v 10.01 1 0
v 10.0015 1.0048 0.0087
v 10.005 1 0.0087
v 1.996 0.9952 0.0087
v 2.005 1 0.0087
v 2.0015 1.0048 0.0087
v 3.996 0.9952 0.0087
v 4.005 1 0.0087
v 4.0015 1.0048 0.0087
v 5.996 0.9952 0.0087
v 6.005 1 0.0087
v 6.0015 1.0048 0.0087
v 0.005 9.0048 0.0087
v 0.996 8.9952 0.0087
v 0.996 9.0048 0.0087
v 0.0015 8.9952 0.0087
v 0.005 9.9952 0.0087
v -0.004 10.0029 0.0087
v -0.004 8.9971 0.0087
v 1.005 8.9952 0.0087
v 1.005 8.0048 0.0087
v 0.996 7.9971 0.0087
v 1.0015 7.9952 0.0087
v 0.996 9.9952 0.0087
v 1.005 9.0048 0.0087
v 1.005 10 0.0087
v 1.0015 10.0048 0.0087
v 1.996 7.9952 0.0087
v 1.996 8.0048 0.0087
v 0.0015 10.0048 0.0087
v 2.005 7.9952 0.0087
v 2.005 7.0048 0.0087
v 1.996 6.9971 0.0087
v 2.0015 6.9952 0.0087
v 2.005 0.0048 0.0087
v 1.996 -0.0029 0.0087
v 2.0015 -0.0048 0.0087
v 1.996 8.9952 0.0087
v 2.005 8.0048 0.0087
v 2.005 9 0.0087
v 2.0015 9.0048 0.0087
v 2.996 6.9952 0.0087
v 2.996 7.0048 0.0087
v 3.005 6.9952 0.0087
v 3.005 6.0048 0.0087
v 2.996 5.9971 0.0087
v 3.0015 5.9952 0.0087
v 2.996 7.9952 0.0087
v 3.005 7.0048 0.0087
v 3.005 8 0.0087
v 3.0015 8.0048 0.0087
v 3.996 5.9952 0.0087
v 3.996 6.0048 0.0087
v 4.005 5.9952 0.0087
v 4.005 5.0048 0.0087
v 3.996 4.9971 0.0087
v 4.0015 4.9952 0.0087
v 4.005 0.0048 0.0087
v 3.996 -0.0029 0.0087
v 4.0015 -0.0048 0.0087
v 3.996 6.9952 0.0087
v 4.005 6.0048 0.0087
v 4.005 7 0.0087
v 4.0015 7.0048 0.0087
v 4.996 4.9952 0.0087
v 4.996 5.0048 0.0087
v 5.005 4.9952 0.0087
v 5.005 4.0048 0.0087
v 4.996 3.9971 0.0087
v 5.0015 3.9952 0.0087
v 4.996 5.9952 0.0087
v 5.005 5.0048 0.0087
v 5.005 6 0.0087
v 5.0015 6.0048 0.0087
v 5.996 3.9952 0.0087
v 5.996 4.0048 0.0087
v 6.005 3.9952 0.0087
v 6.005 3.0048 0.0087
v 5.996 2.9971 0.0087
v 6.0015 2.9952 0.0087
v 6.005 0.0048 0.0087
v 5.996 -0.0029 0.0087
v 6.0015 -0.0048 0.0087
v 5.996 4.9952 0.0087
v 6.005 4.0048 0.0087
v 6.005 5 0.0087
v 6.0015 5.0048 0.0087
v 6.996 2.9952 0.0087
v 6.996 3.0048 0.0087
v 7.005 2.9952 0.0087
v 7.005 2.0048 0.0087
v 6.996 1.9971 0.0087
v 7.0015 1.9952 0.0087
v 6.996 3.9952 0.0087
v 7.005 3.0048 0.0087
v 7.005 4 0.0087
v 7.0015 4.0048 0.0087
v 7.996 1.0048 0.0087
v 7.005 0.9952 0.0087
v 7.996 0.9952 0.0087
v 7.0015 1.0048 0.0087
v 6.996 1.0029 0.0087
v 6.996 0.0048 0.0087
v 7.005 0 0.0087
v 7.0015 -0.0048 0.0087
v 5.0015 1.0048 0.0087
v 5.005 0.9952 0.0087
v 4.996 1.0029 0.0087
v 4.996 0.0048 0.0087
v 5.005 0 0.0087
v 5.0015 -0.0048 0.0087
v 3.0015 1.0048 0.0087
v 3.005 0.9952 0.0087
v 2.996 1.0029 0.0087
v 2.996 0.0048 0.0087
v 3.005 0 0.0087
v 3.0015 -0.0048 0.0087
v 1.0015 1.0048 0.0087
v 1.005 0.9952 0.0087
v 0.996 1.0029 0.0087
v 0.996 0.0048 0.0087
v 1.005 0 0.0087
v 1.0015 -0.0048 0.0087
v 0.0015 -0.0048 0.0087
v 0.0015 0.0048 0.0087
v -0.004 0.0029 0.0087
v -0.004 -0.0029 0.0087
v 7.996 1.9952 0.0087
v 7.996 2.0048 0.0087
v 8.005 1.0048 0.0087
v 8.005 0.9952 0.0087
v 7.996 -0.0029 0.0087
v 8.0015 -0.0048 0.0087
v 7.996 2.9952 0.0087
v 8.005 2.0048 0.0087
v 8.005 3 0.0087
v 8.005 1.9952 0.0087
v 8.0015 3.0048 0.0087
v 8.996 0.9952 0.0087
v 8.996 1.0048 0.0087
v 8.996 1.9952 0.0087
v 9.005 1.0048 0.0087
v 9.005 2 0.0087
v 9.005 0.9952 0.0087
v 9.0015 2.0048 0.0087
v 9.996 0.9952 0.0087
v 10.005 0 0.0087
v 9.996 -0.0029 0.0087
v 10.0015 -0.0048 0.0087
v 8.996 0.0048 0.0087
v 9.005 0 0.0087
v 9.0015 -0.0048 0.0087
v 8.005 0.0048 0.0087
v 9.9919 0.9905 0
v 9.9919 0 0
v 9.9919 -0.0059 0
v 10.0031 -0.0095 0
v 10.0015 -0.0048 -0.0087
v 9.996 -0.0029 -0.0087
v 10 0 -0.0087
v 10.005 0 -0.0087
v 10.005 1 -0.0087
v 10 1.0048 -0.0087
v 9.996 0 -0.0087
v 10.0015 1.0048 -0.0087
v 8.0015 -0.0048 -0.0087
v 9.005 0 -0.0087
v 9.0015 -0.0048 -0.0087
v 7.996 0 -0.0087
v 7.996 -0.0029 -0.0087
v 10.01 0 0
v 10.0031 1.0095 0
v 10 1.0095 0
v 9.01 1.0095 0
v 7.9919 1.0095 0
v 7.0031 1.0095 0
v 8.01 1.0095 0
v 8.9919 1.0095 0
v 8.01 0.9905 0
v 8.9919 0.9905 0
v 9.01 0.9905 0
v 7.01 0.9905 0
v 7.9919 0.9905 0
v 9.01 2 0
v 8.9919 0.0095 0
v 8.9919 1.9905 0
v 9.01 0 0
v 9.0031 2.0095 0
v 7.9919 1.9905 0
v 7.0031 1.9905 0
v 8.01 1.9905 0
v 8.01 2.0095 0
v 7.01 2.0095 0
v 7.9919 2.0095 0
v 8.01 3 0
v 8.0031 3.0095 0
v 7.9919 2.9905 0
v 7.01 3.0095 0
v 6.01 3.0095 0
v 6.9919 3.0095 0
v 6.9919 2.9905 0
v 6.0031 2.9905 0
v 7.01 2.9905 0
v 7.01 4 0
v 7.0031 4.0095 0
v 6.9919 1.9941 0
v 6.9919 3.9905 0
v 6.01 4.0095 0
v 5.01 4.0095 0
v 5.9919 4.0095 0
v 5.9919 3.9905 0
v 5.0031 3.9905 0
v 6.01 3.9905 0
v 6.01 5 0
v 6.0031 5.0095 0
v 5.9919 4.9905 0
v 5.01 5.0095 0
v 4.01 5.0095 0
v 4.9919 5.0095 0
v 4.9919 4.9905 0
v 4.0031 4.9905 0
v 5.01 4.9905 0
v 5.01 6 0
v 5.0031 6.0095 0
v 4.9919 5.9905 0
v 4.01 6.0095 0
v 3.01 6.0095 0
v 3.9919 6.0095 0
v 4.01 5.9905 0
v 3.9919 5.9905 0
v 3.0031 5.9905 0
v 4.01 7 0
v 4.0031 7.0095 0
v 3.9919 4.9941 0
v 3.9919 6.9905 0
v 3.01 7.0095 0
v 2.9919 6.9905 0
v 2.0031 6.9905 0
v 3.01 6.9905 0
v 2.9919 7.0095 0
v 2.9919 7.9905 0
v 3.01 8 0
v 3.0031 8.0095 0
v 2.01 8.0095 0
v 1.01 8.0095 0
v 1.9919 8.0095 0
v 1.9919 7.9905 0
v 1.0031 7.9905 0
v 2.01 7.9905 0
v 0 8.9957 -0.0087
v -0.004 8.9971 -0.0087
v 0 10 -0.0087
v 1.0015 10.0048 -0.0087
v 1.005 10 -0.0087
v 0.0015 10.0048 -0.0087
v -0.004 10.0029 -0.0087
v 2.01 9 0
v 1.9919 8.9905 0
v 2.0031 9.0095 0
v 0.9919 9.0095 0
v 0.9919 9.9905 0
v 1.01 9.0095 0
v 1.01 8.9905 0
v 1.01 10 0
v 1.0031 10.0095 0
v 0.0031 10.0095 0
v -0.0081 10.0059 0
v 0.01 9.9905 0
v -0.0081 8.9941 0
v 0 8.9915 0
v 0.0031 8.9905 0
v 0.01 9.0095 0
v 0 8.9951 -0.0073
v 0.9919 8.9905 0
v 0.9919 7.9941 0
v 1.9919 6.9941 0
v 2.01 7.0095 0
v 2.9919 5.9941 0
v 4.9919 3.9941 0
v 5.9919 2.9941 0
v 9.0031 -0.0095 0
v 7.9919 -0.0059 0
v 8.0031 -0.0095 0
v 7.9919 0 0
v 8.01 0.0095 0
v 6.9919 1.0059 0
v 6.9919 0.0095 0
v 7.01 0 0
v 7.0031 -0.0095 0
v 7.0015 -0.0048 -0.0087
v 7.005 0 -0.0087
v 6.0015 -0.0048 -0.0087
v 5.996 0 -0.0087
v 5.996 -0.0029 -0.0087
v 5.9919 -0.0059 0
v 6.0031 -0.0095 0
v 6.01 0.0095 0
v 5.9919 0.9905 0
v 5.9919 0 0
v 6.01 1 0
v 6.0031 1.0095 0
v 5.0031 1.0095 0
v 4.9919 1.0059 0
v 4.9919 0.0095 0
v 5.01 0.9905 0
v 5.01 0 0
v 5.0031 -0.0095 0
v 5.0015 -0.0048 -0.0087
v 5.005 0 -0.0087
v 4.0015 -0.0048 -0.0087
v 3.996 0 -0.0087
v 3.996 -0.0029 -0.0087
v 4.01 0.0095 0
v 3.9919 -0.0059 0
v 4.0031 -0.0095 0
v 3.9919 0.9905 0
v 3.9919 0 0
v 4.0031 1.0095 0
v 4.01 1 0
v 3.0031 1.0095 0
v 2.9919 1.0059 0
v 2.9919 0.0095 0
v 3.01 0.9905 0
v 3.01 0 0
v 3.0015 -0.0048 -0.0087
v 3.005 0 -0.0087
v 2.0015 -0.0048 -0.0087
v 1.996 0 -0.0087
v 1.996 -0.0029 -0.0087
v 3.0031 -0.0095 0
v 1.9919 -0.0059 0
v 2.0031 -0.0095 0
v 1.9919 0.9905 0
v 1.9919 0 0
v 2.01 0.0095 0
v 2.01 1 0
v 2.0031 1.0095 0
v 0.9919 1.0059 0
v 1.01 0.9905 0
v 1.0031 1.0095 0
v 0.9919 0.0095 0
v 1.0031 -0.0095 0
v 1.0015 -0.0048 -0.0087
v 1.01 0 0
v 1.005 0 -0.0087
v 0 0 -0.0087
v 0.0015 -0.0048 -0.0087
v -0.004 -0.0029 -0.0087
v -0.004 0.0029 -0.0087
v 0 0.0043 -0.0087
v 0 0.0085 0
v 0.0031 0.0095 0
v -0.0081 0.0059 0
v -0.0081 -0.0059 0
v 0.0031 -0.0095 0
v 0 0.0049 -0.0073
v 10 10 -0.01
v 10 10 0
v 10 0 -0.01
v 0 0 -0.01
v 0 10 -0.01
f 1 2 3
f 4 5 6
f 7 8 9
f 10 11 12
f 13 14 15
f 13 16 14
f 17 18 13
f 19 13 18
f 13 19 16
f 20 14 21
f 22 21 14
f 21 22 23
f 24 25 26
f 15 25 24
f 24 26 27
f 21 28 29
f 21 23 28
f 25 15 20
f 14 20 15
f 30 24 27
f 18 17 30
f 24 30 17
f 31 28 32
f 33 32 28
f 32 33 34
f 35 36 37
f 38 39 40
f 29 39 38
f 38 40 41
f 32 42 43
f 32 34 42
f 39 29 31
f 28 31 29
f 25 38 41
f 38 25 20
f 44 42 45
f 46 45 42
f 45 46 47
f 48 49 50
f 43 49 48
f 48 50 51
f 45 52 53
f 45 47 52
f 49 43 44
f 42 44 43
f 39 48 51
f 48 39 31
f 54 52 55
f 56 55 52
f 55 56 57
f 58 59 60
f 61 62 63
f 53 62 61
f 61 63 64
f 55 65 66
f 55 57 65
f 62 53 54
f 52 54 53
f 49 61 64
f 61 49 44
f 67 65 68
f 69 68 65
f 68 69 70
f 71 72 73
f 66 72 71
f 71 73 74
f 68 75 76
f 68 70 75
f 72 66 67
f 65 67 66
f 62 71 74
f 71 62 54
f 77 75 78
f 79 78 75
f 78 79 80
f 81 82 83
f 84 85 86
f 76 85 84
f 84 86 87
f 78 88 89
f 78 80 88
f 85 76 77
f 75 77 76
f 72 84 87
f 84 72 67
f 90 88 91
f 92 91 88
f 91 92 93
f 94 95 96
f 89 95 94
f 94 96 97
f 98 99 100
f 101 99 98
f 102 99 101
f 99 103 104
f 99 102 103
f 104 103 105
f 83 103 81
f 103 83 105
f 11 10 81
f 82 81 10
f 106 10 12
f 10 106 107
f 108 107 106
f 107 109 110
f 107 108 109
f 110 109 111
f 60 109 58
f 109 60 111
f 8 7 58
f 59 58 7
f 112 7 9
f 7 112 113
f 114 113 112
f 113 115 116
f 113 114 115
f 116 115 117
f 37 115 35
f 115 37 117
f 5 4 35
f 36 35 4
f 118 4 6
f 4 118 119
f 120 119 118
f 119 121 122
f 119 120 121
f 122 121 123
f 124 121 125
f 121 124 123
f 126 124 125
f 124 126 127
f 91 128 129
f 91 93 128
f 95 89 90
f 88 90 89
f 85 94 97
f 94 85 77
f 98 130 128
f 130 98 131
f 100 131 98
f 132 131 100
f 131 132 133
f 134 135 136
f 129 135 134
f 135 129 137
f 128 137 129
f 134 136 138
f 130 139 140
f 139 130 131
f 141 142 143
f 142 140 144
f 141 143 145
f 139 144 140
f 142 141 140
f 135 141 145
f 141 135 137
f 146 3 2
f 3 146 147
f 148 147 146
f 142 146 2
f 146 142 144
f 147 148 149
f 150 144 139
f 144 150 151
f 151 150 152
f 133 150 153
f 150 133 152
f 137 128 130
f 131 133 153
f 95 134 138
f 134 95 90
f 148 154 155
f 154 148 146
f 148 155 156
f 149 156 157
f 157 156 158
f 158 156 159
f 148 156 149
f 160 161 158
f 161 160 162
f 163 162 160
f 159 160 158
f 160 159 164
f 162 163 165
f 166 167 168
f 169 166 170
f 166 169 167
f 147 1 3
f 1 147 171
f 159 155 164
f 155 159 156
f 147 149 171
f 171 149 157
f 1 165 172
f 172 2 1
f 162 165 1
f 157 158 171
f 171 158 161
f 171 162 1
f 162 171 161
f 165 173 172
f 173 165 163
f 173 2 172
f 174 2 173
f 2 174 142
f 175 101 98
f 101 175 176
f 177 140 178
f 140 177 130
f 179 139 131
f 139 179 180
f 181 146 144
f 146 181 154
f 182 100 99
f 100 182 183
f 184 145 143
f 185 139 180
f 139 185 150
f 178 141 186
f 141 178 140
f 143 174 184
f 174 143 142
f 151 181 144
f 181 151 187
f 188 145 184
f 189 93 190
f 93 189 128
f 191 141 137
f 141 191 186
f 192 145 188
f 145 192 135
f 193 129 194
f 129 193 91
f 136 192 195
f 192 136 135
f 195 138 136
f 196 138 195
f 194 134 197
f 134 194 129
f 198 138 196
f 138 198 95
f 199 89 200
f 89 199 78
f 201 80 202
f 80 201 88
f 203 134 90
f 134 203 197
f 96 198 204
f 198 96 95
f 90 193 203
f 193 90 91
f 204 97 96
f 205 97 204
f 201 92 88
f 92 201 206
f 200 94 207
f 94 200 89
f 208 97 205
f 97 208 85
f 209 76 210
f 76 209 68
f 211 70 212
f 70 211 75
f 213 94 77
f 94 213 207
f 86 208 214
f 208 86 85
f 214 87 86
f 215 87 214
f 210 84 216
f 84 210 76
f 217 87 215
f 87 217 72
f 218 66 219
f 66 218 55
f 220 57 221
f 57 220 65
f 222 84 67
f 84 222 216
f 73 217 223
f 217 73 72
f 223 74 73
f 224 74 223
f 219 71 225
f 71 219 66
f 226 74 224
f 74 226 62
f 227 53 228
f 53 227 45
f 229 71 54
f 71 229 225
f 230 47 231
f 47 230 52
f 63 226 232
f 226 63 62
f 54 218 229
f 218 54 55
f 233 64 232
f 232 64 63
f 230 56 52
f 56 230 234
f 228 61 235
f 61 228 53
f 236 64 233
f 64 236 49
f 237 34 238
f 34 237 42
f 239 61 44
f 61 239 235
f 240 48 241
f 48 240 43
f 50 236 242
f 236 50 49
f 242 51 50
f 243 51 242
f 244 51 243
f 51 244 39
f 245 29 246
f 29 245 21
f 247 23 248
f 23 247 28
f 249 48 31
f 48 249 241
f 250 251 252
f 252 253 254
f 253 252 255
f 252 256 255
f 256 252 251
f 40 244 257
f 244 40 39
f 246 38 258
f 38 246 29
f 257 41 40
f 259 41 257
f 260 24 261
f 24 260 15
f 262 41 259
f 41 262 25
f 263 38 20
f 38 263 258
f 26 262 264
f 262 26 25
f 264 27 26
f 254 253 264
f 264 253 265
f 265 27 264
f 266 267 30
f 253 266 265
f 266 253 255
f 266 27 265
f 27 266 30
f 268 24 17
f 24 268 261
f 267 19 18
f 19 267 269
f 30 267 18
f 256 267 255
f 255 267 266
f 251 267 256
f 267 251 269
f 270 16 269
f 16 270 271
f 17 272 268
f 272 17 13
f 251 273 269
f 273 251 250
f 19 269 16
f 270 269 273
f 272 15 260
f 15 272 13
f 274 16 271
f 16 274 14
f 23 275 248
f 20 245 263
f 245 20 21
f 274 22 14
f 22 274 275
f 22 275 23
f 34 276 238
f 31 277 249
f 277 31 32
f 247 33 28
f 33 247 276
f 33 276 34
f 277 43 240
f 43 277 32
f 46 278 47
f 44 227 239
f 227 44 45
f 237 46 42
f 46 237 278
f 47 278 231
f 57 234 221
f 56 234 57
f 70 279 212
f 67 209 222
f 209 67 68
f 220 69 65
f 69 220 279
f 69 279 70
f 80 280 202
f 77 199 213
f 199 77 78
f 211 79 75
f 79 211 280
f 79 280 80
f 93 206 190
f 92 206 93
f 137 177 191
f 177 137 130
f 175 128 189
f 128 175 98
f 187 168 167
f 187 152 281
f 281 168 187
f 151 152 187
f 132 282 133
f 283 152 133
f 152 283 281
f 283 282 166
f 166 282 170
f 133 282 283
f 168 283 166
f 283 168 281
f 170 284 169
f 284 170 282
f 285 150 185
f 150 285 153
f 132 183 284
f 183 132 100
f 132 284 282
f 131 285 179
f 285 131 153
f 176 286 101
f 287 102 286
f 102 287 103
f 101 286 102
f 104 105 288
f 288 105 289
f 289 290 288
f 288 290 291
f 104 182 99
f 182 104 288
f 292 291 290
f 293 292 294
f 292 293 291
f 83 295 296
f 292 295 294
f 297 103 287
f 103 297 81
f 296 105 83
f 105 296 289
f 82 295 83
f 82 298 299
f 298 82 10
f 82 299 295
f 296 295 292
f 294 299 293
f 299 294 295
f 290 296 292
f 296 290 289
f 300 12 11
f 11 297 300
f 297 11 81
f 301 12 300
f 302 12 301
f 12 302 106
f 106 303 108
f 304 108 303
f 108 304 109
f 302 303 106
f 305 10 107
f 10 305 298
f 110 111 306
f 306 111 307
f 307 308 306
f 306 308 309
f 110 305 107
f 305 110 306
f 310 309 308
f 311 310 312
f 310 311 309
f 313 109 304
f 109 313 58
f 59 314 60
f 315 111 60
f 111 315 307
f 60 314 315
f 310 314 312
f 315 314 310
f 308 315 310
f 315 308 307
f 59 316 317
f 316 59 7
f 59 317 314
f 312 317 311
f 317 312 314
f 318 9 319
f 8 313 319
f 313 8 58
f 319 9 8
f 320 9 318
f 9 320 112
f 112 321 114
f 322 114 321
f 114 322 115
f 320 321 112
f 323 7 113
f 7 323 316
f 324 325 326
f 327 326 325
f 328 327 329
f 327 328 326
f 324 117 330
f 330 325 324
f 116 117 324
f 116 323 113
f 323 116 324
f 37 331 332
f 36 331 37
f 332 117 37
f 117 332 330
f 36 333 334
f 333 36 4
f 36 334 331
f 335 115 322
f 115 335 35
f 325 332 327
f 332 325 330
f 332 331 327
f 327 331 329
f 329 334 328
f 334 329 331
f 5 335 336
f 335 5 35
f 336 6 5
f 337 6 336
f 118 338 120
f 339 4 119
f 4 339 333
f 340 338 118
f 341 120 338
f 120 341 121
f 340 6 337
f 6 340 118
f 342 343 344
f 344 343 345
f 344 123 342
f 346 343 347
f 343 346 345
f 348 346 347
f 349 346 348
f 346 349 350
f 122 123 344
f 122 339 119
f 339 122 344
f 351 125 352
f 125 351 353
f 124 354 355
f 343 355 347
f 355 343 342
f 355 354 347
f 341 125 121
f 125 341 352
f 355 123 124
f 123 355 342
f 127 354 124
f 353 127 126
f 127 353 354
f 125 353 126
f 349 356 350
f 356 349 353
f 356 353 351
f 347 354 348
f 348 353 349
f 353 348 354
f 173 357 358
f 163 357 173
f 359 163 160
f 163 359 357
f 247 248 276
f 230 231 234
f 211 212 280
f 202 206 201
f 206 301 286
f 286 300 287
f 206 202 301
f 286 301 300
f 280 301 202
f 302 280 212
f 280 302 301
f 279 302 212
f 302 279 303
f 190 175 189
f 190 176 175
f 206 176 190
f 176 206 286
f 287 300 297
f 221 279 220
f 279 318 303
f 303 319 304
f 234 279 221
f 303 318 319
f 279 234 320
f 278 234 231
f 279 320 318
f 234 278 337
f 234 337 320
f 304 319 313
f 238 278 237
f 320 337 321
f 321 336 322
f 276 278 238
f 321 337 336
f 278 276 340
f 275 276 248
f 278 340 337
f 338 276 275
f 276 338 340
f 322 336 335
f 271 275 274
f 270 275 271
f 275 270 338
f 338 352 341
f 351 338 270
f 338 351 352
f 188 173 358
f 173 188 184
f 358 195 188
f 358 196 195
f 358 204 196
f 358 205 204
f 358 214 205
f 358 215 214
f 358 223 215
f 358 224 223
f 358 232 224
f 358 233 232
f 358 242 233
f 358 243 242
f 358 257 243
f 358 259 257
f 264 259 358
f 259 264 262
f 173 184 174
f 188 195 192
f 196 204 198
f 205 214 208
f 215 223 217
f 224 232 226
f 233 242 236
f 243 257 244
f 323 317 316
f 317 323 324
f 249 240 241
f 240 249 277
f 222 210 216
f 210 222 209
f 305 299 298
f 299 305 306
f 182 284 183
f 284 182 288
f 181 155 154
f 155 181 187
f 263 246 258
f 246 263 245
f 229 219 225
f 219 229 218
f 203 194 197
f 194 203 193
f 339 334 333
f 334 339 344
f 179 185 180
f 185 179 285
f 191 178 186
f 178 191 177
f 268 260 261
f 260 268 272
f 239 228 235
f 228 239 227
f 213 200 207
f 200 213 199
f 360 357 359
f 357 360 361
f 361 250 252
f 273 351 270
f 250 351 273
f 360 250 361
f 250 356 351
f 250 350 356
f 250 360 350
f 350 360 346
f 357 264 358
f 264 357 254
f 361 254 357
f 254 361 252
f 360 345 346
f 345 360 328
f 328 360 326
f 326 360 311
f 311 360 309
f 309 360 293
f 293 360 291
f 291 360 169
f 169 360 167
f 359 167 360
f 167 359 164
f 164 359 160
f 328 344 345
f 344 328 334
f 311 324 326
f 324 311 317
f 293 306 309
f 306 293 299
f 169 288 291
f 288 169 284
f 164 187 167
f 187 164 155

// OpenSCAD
hull(){
    translate([10.0, 0.0]) sphere(0.01);
    translate([10.0, 1.0]) sphere(0.01);
}
hull(){
    translate([10.0, 1.0]) sphere(0.01);
    translate([9.0, 1.0]) sphere(0.01);
}
hull(){
    translate([9.0, 1.0]) sphere(0.01);
    translate([9.0, 2.0]) sphere(0.01);
}
hull(){
    translate([9.0, 2.0]) sphere(0.01);
    translate([8.0, 2.0]) sphere(0.01);
}
hull(){
    translate([8.0, 2.0]) sphere(0.01);
    translate([8.0, 3.0]) sphere(0.01);
}
hull(){
    translate([8.0, 3.0]) sphere(0.01);
    translate([7.0, 3.0]) sphere(0.01);
}
hull(){
    translate([7.0, 3.0]) sphere(0.01);
    translate([7.0, 4.0]) sphere(0.01);
}
hull(){
    translate([7.0, 4.0]) sphere(0.01);
    translate([6.0, 4.0]) sphere(0.01);
}
hull(){
    translate([6.0, 4.0]) sphere(0.01);
    translate([6.0, 5.0]) sphere(0.01);
}
hull(){
    translate([6.0, 5.0]) sphere(0.01);
    translate([5.0, 5.0]) sphere(0.01);
}
hull(){
    translate([5.0, 5.0]) sphere(0.01);
    translate([5.0, 6.0]) sphere(0.01);
}
hull(){
    translate([5.0, 6.0]) sphere(0.01);
    translate([4.0, 6.0]) sphere(0.01);
}
hull(){
    translate([4.0, 6.0]) sphere(0.01);
    translate([4.0, 7.0]) sphere(0.01);
}
hull(){
    translate([4.0, 7.0]) sphere(0.01);
    translate([3.0, 7.0]) sphere(0.01);
}
hull(){
    translate([3.0, 7.0]) sphere(0.01);
    translate([3.0, 8.0]) sphere(0.01);
}
hull(){
    translate([3.0, 8.0]) sphere(0.01);
    translate([2.0, 8.0]) sphere(0.01);
}
hull(){
    translate([2.0, 8.0]) sphere(0.01);
    translate([2.0, 9.0]) sphere(0.01);
}
hull(){
    translate([2.0, 9.0]) sphere(0.01);
    translate([1.0, 9.0]) sphere(0.01);
}
hull(){
    translate([1.0, 9.0]) sphere(0.01);
    translate([1.0, 10.0]) sphere(0.01);
}
hull(){
    translate([1.0, 10.0]) sphere(0.01);
    translate([0.0, 10.0]) sphere(0.01);
}
hull(){
    translate([0.0, 10.0]) sphere(0.01);
    translate([0.0, 9.0]) sphere(0.01);
}
hull(){
    translate([0.0, 9.0]) sphere(0.01);
    translate([1.0, 9.0]) sphere(0.01);
}
hull(){
    translate([1.0, 9.0]) sphere(0.01);
    translate([1.0, 8.0]) sphere(0.01);
}
hull(){
    translate([1.0, 8.0]) sphere(0.01);
    translate([2.0, 8.0]) sphere(0.01);
}
hull(){
    translate([2.0, 8.0]) sphere(0.01);
    translate([2.0, 7.0]) sphere(0.01);
}
hull(){
    translate([2.0, 7.0]) sphere(0.01);
    translate([3.0, 7.0]) sphere(0.01);
}
hull(){
    translate([3.0, 7.0]) sphere(0.01);
    translate([3.0, 6.0]) sphere(0.01);
}
hull(){
    translate([3.0, 6.0]) sphere(0.01);
    translate([4.0, 6.0]) sphere(0.01);
}
hull(){
    translate([4.0, 6.0]) sphere(0.01);
    translate([4.0, 5.0]) sphere(0.01);
}
hull(){
    translate([4.0, 5.0]) sphere(0.01);
    translate([5.0, 5.0]) sphere(0.01);
}
hull(){
    translate([5.0, 5.0]) sphere(0.01);
    translate([5.0, 4.0]) sphere(0.01);
}
hull(){
    translate([5.0, 4.0]) sphere(0.01);
    translate([6.0, 4.0]) sphere(0.01);
}
hull(){
    translate([6.0, 4.0]) sphere(0.01);
    translate([6.0, 3.0]) sphere(0.01);
}
hull(){
    translate([6.0, 3.0]) sphere(0.01);
    translate([7.0, 3.0]) sphere(0.01);
}
hull(){
    translate([7.0, 3.0]) sphere(0.01);
    translate([7.0, 2.0]) sphere(0.01);
}
hull(){
    translate([7.0, 2.0]) sphere(0.01);
    translate([8.0, 2.0]) sphere(0.01);
}
hull(){
    translate([8.0, 2.0]) sphere(0.01);
    translate([8.0, 1.0]) sphere(0.01);
}
hull(){
    translate([8.0, 1.0]) sphere(0.01);
    translate([9.0, 1.0]) sphere(0.01);
}
hull(){
    translate([9.0, 1.0]) sphere(0.01);
    translate([9.0, 0.0]) sphere(0.01);
}
hull(){
    translate([9.0, 0.0]) sphere(0.01);
    translate([8.0, 0.0]) sphere(0.01);
}
hull(){
    translate([8.0, 0.0]) sphere(0.01);
    translate([8.0, 1.0]) sphere(0.01);
}
hull(){
    translate([8.0, 1.0]) sphere(0.01);
    translate([7.0, 1.0]) sphere(0.01);
}
hull(){
    translate([7.0, 1.0]) sphere(0.01);
    translate([7.0, 0.0]) sphere(0.01);
}
hull(){
    translate([7.0, 0.0]) sphere(0.01);
    translate([6.0, 0.0]) sphere(0.01);
}
hull(){
    translate([6.0, 0.0]) sphere(0.01);
    translate([6.0, 1.0]) sphere(0.01);
}
hull(){
    translate([6.0, 1.0]) sphere(0.01);
    translate([5.0, 1.0]) sphere(0.01);
}
hull(){
    translate([5.0, 1.0]) sphere(0.01);
    translate([5.0, 0.0]) sphere(0.01);
}
hull(){
    translate([5.0, 0.0]) sphere(0.01);
    translate([4.0, 0.0]) sphere(0.01);
}
hull(){
    translate([4.0, 0.0]) sphere(0.01);
    translate([4.0, 1.0]) sphere(0.01);
}
hull(){
    translate([4.0, 1.0]) sphere(0.01);
    translate([3.0, 1.0]) sphere(0.01);
}
hull(){
    translate([3.0, 1.0]) sphere(0.01);
    translate([3.0, 0.0]) sphere(0.01);
}
hull(){
    translate([3.0, 0.0]) sphere(0.01);
    translate([2.0, 0.0]) sphere(0.01);
}
hull(){
    translate([2.0, 0.0]) sphere(0.01);
    translate([2.0, 1.0]) sphere(0.01);
}
hull(){
    translate([2.0, 1.0]) sphere(0.01);
    translate([1.0, 1.0]) sphere(0.01);
}
hull(){
    translate([1.0, 1.0]) sphere(0.01);
    translate([1.0, 0.0]) sphere(0.01);
}
hull(){
    translate([1.0, 0.0]) sphere(0.01);
    translate([0.0, 0.0]) sphere(0.01);
}
translate([0,0,-0.01]) color([0.1,0.1,0.1]) cube([10,10,0.01]);
